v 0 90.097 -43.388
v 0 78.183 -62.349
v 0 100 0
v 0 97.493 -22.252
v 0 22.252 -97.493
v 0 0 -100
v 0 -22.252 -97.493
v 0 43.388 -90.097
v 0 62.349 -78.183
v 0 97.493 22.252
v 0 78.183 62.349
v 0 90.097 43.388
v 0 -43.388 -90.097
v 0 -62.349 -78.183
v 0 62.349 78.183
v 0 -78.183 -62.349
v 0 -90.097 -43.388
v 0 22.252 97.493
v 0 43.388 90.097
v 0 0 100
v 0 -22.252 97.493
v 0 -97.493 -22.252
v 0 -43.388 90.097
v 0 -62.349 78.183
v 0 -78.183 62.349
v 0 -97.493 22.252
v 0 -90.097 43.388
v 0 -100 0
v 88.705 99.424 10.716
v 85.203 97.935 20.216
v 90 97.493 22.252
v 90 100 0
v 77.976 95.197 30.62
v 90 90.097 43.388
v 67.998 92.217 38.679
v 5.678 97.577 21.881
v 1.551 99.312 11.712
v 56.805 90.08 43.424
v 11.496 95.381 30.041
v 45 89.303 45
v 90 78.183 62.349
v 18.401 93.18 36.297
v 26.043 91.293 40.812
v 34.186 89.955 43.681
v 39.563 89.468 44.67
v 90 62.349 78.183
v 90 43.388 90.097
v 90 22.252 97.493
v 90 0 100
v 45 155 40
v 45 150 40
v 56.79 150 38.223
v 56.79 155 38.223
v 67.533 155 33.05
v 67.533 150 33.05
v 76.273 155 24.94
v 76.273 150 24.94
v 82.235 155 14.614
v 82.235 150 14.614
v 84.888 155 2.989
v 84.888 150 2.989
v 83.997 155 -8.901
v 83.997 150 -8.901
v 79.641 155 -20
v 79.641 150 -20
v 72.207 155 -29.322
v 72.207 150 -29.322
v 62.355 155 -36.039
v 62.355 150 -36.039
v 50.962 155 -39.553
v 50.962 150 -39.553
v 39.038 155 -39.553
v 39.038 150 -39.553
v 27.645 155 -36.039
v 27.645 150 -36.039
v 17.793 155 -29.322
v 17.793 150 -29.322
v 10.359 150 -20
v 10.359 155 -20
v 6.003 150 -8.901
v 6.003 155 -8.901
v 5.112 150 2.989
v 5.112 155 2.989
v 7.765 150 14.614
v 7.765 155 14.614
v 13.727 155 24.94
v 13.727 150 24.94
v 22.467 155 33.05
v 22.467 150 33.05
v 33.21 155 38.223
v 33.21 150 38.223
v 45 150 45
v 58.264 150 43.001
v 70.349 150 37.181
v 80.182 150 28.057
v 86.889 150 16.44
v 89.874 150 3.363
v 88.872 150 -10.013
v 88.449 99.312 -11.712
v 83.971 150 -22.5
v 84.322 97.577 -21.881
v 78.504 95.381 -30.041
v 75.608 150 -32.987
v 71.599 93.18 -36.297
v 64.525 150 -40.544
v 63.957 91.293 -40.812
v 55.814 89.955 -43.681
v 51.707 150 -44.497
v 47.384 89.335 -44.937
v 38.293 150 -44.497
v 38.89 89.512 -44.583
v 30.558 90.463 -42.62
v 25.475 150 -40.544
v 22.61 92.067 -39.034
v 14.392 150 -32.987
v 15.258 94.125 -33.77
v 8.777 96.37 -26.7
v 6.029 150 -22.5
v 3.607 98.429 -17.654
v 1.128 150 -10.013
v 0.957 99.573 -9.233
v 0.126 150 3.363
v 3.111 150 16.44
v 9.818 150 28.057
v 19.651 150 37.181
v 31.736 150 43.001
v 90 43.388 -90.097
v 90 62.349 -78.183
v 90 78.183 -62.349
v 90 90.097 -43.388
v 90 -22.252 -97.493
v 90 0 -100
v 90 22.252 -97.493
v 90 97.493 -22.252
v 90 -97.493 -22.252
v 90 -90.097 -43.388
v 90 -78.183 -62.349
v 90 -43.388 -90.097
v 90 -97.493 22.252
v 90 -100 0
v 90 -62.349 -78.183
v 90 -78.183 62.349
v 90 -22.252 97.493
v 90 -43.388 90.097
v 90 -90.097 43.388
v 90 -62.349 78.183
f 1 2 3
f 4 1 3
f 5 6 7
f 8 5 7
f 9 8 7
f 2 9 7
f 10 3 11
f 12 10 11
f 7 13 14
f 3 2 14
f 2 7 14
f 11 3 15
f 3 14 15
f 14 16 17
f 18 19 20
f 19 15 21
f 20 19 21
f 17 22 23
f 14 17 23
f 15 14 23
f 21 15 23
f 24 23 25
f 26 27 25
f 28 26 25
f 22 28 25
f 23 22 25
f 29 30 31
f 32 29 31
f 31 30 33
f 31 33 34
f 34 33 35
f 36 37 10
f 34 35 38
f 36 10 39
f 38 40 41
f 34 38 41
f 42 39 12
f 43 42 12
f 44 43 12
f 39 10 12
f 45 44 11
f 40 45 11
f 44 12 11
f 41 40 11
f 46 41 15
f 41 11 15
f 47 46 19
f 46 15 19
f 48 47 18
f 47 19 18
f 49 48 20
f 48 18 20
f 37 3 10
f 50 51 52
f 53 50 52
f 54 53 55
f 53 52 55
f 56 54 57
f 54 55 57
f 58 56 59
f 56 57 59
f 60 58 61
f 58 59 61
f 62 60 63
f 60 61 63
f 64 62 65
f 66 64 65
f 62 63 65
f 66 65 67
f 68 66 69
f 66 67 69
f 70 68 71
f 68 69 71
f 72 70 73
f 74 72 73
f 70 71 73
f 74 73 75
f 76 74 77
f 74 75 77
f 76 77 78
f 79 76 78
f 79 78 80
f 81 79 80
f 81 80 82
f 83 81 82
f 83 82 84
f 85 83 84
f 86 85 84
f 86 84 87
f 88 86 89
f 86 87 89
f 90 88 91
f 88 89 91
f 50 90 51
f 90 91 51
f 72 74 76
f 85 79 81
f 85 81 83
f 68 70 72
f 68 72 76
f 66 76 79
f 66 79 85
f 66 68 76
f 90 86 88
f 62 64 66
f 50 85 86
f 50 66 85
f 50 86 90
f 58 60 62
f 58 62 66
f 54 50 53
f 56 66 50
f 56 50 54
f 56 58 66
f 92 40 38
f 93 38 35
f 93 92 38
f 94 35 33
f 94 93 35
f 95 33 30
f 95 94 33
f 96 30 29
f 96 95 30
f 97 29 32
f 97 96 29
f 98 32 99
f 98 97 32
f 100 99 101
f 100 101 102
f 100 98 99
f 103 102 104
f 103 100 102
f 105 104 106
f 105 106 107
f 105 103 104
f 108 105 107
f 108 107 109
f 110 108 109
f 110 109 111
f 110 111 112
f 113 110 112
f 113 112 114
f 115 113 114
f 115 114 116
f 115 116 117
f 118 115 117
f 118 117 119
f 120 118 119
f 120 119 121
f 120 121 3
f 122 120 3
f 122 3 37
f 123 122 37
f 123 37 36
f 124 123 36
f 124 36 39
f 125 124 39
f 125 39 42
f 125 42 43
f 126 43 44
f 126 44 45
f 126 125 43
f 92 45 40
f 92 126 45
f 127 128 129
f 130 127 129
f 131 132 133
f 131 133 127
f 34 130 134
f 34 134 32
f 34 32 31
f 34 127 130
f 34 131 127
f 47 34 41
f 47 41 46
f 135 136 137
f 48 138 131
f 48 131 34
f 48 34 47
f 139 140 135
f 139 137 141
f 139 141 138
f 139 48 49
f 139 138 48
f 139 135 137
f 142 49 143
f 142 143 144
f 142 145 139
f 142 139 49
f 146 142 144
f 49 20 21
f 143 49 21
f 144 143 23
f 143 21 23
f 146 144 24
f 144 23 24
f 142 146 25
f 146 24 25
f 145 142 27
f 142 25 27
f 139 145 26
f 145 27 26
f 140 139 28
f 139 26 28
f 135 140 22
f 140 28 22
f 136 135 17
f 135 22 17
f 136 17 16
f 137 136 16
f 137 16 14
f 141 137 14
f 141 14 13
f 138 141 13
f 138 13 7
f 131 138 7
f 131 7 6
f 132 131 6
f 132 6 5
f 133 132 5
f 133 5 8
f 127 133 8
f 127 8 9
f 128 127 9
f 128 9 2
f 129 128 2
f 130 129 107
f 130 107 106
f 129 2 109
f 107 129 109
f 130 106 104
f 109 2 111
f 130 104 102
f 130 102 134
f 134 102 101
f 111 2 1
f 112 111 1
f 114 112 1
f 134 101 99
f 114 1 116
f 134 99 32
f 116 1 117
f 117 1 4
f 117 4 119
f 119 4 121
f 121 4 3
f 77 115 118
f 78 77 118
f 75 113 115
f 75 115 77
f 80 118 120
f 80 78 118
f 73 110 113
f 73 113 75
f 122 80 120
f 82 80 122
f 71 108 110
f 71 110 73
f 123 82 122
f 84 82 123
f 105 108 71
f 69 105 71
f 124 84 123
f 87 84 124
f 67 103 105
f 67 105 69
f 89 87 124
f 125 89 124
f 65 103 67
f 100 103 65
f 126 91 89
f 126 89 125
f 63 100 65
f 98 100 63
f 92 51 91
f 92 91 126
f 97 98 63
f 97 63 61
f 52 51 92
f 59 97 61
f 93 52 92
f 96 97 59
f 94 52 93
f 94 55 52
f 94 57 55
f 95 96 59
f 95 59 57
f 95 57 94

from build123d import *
from build123d.topology import SkipClean

# Parameters (mm, degrees)
SKETCH3_R                = 100
BOSS_EXTRUDE1_DEPTH      = 90
BOSS_EXTRUDE2_REACH      = 285.901
BOSS_EXTRUDE2_END_RADIUS = 100
SKETCH4_R                = 45
SKETCH5_R                = 40
BOSS_EXTRUDE3_DEPTH      = 5


with BuildPart() as part:
    # Sketch3 → Boss-Extrude1 (new body)
    with BuildSketch(Plane(origin=(0, 0, 0), x_dir=(0, 0, -1), z_dir=(1, 0, 0))):
        with Locations(Location((0, 0, 0), (0, 0, 180))):
            Circle(SKETCH3_R)
    extrude(amount=BOSS_EXTRUDE1_DEPTH)

    # Boss-Extrude2: up to this cylinder (the profile starts outside it)
    with SkipClean():  # the faces are left unmerged after this step: merging them gives an invalid solid
        boss_extrude2_end = Plane(origin=(45, 0, 0), z_dir=(-1, 0, 0)) * Cylinder(BOSS_EXTRUDE2_END_RADIUS, 772.802, mode=Mode.PRIVATE)
        # Sketch4 → Boss-Extrude2 (add, up to the surface)
        with BuildSketch(Plane(origin=(0, 150, 0), x_dir=(1, 0, 0), z_dir=(0, 1, 0)), mode=Mode.PRIVATE) as boss_extrude2_sk1:
            with Locations(Location((45, 0, 0), (0, 0, 270))):
                Circle(SKETCH4_R)
        boss_extrude2_tool1 = extrude(boss_extrude2_sk1.sketch, amount=-BOSS_EXTRUDE2_REACH, mode=Mode.PRIVATE) - boss_extrude2_end
        add(boss_extrude2_tool1.solids().sort_by_distance((45, 150, 0))[0])

    # Sketch5 → Boss-Extrude3 (add)
    with SkipClean():  # the faces are left unmerged after this step: merging them gives an invalid solid
        with BuildSketch(Plane(origin=(0, 150, 0), x_dir=(1, 0, 0), z_dir=(0, 1, 0))):
            with Locations(Location((45, 0, 0), (0, 0, 270))):
                Circle(SKETCH5_R)
        extrude(amount=BOSS_EXTRUDE3_DEPTH)


solid = part.part
